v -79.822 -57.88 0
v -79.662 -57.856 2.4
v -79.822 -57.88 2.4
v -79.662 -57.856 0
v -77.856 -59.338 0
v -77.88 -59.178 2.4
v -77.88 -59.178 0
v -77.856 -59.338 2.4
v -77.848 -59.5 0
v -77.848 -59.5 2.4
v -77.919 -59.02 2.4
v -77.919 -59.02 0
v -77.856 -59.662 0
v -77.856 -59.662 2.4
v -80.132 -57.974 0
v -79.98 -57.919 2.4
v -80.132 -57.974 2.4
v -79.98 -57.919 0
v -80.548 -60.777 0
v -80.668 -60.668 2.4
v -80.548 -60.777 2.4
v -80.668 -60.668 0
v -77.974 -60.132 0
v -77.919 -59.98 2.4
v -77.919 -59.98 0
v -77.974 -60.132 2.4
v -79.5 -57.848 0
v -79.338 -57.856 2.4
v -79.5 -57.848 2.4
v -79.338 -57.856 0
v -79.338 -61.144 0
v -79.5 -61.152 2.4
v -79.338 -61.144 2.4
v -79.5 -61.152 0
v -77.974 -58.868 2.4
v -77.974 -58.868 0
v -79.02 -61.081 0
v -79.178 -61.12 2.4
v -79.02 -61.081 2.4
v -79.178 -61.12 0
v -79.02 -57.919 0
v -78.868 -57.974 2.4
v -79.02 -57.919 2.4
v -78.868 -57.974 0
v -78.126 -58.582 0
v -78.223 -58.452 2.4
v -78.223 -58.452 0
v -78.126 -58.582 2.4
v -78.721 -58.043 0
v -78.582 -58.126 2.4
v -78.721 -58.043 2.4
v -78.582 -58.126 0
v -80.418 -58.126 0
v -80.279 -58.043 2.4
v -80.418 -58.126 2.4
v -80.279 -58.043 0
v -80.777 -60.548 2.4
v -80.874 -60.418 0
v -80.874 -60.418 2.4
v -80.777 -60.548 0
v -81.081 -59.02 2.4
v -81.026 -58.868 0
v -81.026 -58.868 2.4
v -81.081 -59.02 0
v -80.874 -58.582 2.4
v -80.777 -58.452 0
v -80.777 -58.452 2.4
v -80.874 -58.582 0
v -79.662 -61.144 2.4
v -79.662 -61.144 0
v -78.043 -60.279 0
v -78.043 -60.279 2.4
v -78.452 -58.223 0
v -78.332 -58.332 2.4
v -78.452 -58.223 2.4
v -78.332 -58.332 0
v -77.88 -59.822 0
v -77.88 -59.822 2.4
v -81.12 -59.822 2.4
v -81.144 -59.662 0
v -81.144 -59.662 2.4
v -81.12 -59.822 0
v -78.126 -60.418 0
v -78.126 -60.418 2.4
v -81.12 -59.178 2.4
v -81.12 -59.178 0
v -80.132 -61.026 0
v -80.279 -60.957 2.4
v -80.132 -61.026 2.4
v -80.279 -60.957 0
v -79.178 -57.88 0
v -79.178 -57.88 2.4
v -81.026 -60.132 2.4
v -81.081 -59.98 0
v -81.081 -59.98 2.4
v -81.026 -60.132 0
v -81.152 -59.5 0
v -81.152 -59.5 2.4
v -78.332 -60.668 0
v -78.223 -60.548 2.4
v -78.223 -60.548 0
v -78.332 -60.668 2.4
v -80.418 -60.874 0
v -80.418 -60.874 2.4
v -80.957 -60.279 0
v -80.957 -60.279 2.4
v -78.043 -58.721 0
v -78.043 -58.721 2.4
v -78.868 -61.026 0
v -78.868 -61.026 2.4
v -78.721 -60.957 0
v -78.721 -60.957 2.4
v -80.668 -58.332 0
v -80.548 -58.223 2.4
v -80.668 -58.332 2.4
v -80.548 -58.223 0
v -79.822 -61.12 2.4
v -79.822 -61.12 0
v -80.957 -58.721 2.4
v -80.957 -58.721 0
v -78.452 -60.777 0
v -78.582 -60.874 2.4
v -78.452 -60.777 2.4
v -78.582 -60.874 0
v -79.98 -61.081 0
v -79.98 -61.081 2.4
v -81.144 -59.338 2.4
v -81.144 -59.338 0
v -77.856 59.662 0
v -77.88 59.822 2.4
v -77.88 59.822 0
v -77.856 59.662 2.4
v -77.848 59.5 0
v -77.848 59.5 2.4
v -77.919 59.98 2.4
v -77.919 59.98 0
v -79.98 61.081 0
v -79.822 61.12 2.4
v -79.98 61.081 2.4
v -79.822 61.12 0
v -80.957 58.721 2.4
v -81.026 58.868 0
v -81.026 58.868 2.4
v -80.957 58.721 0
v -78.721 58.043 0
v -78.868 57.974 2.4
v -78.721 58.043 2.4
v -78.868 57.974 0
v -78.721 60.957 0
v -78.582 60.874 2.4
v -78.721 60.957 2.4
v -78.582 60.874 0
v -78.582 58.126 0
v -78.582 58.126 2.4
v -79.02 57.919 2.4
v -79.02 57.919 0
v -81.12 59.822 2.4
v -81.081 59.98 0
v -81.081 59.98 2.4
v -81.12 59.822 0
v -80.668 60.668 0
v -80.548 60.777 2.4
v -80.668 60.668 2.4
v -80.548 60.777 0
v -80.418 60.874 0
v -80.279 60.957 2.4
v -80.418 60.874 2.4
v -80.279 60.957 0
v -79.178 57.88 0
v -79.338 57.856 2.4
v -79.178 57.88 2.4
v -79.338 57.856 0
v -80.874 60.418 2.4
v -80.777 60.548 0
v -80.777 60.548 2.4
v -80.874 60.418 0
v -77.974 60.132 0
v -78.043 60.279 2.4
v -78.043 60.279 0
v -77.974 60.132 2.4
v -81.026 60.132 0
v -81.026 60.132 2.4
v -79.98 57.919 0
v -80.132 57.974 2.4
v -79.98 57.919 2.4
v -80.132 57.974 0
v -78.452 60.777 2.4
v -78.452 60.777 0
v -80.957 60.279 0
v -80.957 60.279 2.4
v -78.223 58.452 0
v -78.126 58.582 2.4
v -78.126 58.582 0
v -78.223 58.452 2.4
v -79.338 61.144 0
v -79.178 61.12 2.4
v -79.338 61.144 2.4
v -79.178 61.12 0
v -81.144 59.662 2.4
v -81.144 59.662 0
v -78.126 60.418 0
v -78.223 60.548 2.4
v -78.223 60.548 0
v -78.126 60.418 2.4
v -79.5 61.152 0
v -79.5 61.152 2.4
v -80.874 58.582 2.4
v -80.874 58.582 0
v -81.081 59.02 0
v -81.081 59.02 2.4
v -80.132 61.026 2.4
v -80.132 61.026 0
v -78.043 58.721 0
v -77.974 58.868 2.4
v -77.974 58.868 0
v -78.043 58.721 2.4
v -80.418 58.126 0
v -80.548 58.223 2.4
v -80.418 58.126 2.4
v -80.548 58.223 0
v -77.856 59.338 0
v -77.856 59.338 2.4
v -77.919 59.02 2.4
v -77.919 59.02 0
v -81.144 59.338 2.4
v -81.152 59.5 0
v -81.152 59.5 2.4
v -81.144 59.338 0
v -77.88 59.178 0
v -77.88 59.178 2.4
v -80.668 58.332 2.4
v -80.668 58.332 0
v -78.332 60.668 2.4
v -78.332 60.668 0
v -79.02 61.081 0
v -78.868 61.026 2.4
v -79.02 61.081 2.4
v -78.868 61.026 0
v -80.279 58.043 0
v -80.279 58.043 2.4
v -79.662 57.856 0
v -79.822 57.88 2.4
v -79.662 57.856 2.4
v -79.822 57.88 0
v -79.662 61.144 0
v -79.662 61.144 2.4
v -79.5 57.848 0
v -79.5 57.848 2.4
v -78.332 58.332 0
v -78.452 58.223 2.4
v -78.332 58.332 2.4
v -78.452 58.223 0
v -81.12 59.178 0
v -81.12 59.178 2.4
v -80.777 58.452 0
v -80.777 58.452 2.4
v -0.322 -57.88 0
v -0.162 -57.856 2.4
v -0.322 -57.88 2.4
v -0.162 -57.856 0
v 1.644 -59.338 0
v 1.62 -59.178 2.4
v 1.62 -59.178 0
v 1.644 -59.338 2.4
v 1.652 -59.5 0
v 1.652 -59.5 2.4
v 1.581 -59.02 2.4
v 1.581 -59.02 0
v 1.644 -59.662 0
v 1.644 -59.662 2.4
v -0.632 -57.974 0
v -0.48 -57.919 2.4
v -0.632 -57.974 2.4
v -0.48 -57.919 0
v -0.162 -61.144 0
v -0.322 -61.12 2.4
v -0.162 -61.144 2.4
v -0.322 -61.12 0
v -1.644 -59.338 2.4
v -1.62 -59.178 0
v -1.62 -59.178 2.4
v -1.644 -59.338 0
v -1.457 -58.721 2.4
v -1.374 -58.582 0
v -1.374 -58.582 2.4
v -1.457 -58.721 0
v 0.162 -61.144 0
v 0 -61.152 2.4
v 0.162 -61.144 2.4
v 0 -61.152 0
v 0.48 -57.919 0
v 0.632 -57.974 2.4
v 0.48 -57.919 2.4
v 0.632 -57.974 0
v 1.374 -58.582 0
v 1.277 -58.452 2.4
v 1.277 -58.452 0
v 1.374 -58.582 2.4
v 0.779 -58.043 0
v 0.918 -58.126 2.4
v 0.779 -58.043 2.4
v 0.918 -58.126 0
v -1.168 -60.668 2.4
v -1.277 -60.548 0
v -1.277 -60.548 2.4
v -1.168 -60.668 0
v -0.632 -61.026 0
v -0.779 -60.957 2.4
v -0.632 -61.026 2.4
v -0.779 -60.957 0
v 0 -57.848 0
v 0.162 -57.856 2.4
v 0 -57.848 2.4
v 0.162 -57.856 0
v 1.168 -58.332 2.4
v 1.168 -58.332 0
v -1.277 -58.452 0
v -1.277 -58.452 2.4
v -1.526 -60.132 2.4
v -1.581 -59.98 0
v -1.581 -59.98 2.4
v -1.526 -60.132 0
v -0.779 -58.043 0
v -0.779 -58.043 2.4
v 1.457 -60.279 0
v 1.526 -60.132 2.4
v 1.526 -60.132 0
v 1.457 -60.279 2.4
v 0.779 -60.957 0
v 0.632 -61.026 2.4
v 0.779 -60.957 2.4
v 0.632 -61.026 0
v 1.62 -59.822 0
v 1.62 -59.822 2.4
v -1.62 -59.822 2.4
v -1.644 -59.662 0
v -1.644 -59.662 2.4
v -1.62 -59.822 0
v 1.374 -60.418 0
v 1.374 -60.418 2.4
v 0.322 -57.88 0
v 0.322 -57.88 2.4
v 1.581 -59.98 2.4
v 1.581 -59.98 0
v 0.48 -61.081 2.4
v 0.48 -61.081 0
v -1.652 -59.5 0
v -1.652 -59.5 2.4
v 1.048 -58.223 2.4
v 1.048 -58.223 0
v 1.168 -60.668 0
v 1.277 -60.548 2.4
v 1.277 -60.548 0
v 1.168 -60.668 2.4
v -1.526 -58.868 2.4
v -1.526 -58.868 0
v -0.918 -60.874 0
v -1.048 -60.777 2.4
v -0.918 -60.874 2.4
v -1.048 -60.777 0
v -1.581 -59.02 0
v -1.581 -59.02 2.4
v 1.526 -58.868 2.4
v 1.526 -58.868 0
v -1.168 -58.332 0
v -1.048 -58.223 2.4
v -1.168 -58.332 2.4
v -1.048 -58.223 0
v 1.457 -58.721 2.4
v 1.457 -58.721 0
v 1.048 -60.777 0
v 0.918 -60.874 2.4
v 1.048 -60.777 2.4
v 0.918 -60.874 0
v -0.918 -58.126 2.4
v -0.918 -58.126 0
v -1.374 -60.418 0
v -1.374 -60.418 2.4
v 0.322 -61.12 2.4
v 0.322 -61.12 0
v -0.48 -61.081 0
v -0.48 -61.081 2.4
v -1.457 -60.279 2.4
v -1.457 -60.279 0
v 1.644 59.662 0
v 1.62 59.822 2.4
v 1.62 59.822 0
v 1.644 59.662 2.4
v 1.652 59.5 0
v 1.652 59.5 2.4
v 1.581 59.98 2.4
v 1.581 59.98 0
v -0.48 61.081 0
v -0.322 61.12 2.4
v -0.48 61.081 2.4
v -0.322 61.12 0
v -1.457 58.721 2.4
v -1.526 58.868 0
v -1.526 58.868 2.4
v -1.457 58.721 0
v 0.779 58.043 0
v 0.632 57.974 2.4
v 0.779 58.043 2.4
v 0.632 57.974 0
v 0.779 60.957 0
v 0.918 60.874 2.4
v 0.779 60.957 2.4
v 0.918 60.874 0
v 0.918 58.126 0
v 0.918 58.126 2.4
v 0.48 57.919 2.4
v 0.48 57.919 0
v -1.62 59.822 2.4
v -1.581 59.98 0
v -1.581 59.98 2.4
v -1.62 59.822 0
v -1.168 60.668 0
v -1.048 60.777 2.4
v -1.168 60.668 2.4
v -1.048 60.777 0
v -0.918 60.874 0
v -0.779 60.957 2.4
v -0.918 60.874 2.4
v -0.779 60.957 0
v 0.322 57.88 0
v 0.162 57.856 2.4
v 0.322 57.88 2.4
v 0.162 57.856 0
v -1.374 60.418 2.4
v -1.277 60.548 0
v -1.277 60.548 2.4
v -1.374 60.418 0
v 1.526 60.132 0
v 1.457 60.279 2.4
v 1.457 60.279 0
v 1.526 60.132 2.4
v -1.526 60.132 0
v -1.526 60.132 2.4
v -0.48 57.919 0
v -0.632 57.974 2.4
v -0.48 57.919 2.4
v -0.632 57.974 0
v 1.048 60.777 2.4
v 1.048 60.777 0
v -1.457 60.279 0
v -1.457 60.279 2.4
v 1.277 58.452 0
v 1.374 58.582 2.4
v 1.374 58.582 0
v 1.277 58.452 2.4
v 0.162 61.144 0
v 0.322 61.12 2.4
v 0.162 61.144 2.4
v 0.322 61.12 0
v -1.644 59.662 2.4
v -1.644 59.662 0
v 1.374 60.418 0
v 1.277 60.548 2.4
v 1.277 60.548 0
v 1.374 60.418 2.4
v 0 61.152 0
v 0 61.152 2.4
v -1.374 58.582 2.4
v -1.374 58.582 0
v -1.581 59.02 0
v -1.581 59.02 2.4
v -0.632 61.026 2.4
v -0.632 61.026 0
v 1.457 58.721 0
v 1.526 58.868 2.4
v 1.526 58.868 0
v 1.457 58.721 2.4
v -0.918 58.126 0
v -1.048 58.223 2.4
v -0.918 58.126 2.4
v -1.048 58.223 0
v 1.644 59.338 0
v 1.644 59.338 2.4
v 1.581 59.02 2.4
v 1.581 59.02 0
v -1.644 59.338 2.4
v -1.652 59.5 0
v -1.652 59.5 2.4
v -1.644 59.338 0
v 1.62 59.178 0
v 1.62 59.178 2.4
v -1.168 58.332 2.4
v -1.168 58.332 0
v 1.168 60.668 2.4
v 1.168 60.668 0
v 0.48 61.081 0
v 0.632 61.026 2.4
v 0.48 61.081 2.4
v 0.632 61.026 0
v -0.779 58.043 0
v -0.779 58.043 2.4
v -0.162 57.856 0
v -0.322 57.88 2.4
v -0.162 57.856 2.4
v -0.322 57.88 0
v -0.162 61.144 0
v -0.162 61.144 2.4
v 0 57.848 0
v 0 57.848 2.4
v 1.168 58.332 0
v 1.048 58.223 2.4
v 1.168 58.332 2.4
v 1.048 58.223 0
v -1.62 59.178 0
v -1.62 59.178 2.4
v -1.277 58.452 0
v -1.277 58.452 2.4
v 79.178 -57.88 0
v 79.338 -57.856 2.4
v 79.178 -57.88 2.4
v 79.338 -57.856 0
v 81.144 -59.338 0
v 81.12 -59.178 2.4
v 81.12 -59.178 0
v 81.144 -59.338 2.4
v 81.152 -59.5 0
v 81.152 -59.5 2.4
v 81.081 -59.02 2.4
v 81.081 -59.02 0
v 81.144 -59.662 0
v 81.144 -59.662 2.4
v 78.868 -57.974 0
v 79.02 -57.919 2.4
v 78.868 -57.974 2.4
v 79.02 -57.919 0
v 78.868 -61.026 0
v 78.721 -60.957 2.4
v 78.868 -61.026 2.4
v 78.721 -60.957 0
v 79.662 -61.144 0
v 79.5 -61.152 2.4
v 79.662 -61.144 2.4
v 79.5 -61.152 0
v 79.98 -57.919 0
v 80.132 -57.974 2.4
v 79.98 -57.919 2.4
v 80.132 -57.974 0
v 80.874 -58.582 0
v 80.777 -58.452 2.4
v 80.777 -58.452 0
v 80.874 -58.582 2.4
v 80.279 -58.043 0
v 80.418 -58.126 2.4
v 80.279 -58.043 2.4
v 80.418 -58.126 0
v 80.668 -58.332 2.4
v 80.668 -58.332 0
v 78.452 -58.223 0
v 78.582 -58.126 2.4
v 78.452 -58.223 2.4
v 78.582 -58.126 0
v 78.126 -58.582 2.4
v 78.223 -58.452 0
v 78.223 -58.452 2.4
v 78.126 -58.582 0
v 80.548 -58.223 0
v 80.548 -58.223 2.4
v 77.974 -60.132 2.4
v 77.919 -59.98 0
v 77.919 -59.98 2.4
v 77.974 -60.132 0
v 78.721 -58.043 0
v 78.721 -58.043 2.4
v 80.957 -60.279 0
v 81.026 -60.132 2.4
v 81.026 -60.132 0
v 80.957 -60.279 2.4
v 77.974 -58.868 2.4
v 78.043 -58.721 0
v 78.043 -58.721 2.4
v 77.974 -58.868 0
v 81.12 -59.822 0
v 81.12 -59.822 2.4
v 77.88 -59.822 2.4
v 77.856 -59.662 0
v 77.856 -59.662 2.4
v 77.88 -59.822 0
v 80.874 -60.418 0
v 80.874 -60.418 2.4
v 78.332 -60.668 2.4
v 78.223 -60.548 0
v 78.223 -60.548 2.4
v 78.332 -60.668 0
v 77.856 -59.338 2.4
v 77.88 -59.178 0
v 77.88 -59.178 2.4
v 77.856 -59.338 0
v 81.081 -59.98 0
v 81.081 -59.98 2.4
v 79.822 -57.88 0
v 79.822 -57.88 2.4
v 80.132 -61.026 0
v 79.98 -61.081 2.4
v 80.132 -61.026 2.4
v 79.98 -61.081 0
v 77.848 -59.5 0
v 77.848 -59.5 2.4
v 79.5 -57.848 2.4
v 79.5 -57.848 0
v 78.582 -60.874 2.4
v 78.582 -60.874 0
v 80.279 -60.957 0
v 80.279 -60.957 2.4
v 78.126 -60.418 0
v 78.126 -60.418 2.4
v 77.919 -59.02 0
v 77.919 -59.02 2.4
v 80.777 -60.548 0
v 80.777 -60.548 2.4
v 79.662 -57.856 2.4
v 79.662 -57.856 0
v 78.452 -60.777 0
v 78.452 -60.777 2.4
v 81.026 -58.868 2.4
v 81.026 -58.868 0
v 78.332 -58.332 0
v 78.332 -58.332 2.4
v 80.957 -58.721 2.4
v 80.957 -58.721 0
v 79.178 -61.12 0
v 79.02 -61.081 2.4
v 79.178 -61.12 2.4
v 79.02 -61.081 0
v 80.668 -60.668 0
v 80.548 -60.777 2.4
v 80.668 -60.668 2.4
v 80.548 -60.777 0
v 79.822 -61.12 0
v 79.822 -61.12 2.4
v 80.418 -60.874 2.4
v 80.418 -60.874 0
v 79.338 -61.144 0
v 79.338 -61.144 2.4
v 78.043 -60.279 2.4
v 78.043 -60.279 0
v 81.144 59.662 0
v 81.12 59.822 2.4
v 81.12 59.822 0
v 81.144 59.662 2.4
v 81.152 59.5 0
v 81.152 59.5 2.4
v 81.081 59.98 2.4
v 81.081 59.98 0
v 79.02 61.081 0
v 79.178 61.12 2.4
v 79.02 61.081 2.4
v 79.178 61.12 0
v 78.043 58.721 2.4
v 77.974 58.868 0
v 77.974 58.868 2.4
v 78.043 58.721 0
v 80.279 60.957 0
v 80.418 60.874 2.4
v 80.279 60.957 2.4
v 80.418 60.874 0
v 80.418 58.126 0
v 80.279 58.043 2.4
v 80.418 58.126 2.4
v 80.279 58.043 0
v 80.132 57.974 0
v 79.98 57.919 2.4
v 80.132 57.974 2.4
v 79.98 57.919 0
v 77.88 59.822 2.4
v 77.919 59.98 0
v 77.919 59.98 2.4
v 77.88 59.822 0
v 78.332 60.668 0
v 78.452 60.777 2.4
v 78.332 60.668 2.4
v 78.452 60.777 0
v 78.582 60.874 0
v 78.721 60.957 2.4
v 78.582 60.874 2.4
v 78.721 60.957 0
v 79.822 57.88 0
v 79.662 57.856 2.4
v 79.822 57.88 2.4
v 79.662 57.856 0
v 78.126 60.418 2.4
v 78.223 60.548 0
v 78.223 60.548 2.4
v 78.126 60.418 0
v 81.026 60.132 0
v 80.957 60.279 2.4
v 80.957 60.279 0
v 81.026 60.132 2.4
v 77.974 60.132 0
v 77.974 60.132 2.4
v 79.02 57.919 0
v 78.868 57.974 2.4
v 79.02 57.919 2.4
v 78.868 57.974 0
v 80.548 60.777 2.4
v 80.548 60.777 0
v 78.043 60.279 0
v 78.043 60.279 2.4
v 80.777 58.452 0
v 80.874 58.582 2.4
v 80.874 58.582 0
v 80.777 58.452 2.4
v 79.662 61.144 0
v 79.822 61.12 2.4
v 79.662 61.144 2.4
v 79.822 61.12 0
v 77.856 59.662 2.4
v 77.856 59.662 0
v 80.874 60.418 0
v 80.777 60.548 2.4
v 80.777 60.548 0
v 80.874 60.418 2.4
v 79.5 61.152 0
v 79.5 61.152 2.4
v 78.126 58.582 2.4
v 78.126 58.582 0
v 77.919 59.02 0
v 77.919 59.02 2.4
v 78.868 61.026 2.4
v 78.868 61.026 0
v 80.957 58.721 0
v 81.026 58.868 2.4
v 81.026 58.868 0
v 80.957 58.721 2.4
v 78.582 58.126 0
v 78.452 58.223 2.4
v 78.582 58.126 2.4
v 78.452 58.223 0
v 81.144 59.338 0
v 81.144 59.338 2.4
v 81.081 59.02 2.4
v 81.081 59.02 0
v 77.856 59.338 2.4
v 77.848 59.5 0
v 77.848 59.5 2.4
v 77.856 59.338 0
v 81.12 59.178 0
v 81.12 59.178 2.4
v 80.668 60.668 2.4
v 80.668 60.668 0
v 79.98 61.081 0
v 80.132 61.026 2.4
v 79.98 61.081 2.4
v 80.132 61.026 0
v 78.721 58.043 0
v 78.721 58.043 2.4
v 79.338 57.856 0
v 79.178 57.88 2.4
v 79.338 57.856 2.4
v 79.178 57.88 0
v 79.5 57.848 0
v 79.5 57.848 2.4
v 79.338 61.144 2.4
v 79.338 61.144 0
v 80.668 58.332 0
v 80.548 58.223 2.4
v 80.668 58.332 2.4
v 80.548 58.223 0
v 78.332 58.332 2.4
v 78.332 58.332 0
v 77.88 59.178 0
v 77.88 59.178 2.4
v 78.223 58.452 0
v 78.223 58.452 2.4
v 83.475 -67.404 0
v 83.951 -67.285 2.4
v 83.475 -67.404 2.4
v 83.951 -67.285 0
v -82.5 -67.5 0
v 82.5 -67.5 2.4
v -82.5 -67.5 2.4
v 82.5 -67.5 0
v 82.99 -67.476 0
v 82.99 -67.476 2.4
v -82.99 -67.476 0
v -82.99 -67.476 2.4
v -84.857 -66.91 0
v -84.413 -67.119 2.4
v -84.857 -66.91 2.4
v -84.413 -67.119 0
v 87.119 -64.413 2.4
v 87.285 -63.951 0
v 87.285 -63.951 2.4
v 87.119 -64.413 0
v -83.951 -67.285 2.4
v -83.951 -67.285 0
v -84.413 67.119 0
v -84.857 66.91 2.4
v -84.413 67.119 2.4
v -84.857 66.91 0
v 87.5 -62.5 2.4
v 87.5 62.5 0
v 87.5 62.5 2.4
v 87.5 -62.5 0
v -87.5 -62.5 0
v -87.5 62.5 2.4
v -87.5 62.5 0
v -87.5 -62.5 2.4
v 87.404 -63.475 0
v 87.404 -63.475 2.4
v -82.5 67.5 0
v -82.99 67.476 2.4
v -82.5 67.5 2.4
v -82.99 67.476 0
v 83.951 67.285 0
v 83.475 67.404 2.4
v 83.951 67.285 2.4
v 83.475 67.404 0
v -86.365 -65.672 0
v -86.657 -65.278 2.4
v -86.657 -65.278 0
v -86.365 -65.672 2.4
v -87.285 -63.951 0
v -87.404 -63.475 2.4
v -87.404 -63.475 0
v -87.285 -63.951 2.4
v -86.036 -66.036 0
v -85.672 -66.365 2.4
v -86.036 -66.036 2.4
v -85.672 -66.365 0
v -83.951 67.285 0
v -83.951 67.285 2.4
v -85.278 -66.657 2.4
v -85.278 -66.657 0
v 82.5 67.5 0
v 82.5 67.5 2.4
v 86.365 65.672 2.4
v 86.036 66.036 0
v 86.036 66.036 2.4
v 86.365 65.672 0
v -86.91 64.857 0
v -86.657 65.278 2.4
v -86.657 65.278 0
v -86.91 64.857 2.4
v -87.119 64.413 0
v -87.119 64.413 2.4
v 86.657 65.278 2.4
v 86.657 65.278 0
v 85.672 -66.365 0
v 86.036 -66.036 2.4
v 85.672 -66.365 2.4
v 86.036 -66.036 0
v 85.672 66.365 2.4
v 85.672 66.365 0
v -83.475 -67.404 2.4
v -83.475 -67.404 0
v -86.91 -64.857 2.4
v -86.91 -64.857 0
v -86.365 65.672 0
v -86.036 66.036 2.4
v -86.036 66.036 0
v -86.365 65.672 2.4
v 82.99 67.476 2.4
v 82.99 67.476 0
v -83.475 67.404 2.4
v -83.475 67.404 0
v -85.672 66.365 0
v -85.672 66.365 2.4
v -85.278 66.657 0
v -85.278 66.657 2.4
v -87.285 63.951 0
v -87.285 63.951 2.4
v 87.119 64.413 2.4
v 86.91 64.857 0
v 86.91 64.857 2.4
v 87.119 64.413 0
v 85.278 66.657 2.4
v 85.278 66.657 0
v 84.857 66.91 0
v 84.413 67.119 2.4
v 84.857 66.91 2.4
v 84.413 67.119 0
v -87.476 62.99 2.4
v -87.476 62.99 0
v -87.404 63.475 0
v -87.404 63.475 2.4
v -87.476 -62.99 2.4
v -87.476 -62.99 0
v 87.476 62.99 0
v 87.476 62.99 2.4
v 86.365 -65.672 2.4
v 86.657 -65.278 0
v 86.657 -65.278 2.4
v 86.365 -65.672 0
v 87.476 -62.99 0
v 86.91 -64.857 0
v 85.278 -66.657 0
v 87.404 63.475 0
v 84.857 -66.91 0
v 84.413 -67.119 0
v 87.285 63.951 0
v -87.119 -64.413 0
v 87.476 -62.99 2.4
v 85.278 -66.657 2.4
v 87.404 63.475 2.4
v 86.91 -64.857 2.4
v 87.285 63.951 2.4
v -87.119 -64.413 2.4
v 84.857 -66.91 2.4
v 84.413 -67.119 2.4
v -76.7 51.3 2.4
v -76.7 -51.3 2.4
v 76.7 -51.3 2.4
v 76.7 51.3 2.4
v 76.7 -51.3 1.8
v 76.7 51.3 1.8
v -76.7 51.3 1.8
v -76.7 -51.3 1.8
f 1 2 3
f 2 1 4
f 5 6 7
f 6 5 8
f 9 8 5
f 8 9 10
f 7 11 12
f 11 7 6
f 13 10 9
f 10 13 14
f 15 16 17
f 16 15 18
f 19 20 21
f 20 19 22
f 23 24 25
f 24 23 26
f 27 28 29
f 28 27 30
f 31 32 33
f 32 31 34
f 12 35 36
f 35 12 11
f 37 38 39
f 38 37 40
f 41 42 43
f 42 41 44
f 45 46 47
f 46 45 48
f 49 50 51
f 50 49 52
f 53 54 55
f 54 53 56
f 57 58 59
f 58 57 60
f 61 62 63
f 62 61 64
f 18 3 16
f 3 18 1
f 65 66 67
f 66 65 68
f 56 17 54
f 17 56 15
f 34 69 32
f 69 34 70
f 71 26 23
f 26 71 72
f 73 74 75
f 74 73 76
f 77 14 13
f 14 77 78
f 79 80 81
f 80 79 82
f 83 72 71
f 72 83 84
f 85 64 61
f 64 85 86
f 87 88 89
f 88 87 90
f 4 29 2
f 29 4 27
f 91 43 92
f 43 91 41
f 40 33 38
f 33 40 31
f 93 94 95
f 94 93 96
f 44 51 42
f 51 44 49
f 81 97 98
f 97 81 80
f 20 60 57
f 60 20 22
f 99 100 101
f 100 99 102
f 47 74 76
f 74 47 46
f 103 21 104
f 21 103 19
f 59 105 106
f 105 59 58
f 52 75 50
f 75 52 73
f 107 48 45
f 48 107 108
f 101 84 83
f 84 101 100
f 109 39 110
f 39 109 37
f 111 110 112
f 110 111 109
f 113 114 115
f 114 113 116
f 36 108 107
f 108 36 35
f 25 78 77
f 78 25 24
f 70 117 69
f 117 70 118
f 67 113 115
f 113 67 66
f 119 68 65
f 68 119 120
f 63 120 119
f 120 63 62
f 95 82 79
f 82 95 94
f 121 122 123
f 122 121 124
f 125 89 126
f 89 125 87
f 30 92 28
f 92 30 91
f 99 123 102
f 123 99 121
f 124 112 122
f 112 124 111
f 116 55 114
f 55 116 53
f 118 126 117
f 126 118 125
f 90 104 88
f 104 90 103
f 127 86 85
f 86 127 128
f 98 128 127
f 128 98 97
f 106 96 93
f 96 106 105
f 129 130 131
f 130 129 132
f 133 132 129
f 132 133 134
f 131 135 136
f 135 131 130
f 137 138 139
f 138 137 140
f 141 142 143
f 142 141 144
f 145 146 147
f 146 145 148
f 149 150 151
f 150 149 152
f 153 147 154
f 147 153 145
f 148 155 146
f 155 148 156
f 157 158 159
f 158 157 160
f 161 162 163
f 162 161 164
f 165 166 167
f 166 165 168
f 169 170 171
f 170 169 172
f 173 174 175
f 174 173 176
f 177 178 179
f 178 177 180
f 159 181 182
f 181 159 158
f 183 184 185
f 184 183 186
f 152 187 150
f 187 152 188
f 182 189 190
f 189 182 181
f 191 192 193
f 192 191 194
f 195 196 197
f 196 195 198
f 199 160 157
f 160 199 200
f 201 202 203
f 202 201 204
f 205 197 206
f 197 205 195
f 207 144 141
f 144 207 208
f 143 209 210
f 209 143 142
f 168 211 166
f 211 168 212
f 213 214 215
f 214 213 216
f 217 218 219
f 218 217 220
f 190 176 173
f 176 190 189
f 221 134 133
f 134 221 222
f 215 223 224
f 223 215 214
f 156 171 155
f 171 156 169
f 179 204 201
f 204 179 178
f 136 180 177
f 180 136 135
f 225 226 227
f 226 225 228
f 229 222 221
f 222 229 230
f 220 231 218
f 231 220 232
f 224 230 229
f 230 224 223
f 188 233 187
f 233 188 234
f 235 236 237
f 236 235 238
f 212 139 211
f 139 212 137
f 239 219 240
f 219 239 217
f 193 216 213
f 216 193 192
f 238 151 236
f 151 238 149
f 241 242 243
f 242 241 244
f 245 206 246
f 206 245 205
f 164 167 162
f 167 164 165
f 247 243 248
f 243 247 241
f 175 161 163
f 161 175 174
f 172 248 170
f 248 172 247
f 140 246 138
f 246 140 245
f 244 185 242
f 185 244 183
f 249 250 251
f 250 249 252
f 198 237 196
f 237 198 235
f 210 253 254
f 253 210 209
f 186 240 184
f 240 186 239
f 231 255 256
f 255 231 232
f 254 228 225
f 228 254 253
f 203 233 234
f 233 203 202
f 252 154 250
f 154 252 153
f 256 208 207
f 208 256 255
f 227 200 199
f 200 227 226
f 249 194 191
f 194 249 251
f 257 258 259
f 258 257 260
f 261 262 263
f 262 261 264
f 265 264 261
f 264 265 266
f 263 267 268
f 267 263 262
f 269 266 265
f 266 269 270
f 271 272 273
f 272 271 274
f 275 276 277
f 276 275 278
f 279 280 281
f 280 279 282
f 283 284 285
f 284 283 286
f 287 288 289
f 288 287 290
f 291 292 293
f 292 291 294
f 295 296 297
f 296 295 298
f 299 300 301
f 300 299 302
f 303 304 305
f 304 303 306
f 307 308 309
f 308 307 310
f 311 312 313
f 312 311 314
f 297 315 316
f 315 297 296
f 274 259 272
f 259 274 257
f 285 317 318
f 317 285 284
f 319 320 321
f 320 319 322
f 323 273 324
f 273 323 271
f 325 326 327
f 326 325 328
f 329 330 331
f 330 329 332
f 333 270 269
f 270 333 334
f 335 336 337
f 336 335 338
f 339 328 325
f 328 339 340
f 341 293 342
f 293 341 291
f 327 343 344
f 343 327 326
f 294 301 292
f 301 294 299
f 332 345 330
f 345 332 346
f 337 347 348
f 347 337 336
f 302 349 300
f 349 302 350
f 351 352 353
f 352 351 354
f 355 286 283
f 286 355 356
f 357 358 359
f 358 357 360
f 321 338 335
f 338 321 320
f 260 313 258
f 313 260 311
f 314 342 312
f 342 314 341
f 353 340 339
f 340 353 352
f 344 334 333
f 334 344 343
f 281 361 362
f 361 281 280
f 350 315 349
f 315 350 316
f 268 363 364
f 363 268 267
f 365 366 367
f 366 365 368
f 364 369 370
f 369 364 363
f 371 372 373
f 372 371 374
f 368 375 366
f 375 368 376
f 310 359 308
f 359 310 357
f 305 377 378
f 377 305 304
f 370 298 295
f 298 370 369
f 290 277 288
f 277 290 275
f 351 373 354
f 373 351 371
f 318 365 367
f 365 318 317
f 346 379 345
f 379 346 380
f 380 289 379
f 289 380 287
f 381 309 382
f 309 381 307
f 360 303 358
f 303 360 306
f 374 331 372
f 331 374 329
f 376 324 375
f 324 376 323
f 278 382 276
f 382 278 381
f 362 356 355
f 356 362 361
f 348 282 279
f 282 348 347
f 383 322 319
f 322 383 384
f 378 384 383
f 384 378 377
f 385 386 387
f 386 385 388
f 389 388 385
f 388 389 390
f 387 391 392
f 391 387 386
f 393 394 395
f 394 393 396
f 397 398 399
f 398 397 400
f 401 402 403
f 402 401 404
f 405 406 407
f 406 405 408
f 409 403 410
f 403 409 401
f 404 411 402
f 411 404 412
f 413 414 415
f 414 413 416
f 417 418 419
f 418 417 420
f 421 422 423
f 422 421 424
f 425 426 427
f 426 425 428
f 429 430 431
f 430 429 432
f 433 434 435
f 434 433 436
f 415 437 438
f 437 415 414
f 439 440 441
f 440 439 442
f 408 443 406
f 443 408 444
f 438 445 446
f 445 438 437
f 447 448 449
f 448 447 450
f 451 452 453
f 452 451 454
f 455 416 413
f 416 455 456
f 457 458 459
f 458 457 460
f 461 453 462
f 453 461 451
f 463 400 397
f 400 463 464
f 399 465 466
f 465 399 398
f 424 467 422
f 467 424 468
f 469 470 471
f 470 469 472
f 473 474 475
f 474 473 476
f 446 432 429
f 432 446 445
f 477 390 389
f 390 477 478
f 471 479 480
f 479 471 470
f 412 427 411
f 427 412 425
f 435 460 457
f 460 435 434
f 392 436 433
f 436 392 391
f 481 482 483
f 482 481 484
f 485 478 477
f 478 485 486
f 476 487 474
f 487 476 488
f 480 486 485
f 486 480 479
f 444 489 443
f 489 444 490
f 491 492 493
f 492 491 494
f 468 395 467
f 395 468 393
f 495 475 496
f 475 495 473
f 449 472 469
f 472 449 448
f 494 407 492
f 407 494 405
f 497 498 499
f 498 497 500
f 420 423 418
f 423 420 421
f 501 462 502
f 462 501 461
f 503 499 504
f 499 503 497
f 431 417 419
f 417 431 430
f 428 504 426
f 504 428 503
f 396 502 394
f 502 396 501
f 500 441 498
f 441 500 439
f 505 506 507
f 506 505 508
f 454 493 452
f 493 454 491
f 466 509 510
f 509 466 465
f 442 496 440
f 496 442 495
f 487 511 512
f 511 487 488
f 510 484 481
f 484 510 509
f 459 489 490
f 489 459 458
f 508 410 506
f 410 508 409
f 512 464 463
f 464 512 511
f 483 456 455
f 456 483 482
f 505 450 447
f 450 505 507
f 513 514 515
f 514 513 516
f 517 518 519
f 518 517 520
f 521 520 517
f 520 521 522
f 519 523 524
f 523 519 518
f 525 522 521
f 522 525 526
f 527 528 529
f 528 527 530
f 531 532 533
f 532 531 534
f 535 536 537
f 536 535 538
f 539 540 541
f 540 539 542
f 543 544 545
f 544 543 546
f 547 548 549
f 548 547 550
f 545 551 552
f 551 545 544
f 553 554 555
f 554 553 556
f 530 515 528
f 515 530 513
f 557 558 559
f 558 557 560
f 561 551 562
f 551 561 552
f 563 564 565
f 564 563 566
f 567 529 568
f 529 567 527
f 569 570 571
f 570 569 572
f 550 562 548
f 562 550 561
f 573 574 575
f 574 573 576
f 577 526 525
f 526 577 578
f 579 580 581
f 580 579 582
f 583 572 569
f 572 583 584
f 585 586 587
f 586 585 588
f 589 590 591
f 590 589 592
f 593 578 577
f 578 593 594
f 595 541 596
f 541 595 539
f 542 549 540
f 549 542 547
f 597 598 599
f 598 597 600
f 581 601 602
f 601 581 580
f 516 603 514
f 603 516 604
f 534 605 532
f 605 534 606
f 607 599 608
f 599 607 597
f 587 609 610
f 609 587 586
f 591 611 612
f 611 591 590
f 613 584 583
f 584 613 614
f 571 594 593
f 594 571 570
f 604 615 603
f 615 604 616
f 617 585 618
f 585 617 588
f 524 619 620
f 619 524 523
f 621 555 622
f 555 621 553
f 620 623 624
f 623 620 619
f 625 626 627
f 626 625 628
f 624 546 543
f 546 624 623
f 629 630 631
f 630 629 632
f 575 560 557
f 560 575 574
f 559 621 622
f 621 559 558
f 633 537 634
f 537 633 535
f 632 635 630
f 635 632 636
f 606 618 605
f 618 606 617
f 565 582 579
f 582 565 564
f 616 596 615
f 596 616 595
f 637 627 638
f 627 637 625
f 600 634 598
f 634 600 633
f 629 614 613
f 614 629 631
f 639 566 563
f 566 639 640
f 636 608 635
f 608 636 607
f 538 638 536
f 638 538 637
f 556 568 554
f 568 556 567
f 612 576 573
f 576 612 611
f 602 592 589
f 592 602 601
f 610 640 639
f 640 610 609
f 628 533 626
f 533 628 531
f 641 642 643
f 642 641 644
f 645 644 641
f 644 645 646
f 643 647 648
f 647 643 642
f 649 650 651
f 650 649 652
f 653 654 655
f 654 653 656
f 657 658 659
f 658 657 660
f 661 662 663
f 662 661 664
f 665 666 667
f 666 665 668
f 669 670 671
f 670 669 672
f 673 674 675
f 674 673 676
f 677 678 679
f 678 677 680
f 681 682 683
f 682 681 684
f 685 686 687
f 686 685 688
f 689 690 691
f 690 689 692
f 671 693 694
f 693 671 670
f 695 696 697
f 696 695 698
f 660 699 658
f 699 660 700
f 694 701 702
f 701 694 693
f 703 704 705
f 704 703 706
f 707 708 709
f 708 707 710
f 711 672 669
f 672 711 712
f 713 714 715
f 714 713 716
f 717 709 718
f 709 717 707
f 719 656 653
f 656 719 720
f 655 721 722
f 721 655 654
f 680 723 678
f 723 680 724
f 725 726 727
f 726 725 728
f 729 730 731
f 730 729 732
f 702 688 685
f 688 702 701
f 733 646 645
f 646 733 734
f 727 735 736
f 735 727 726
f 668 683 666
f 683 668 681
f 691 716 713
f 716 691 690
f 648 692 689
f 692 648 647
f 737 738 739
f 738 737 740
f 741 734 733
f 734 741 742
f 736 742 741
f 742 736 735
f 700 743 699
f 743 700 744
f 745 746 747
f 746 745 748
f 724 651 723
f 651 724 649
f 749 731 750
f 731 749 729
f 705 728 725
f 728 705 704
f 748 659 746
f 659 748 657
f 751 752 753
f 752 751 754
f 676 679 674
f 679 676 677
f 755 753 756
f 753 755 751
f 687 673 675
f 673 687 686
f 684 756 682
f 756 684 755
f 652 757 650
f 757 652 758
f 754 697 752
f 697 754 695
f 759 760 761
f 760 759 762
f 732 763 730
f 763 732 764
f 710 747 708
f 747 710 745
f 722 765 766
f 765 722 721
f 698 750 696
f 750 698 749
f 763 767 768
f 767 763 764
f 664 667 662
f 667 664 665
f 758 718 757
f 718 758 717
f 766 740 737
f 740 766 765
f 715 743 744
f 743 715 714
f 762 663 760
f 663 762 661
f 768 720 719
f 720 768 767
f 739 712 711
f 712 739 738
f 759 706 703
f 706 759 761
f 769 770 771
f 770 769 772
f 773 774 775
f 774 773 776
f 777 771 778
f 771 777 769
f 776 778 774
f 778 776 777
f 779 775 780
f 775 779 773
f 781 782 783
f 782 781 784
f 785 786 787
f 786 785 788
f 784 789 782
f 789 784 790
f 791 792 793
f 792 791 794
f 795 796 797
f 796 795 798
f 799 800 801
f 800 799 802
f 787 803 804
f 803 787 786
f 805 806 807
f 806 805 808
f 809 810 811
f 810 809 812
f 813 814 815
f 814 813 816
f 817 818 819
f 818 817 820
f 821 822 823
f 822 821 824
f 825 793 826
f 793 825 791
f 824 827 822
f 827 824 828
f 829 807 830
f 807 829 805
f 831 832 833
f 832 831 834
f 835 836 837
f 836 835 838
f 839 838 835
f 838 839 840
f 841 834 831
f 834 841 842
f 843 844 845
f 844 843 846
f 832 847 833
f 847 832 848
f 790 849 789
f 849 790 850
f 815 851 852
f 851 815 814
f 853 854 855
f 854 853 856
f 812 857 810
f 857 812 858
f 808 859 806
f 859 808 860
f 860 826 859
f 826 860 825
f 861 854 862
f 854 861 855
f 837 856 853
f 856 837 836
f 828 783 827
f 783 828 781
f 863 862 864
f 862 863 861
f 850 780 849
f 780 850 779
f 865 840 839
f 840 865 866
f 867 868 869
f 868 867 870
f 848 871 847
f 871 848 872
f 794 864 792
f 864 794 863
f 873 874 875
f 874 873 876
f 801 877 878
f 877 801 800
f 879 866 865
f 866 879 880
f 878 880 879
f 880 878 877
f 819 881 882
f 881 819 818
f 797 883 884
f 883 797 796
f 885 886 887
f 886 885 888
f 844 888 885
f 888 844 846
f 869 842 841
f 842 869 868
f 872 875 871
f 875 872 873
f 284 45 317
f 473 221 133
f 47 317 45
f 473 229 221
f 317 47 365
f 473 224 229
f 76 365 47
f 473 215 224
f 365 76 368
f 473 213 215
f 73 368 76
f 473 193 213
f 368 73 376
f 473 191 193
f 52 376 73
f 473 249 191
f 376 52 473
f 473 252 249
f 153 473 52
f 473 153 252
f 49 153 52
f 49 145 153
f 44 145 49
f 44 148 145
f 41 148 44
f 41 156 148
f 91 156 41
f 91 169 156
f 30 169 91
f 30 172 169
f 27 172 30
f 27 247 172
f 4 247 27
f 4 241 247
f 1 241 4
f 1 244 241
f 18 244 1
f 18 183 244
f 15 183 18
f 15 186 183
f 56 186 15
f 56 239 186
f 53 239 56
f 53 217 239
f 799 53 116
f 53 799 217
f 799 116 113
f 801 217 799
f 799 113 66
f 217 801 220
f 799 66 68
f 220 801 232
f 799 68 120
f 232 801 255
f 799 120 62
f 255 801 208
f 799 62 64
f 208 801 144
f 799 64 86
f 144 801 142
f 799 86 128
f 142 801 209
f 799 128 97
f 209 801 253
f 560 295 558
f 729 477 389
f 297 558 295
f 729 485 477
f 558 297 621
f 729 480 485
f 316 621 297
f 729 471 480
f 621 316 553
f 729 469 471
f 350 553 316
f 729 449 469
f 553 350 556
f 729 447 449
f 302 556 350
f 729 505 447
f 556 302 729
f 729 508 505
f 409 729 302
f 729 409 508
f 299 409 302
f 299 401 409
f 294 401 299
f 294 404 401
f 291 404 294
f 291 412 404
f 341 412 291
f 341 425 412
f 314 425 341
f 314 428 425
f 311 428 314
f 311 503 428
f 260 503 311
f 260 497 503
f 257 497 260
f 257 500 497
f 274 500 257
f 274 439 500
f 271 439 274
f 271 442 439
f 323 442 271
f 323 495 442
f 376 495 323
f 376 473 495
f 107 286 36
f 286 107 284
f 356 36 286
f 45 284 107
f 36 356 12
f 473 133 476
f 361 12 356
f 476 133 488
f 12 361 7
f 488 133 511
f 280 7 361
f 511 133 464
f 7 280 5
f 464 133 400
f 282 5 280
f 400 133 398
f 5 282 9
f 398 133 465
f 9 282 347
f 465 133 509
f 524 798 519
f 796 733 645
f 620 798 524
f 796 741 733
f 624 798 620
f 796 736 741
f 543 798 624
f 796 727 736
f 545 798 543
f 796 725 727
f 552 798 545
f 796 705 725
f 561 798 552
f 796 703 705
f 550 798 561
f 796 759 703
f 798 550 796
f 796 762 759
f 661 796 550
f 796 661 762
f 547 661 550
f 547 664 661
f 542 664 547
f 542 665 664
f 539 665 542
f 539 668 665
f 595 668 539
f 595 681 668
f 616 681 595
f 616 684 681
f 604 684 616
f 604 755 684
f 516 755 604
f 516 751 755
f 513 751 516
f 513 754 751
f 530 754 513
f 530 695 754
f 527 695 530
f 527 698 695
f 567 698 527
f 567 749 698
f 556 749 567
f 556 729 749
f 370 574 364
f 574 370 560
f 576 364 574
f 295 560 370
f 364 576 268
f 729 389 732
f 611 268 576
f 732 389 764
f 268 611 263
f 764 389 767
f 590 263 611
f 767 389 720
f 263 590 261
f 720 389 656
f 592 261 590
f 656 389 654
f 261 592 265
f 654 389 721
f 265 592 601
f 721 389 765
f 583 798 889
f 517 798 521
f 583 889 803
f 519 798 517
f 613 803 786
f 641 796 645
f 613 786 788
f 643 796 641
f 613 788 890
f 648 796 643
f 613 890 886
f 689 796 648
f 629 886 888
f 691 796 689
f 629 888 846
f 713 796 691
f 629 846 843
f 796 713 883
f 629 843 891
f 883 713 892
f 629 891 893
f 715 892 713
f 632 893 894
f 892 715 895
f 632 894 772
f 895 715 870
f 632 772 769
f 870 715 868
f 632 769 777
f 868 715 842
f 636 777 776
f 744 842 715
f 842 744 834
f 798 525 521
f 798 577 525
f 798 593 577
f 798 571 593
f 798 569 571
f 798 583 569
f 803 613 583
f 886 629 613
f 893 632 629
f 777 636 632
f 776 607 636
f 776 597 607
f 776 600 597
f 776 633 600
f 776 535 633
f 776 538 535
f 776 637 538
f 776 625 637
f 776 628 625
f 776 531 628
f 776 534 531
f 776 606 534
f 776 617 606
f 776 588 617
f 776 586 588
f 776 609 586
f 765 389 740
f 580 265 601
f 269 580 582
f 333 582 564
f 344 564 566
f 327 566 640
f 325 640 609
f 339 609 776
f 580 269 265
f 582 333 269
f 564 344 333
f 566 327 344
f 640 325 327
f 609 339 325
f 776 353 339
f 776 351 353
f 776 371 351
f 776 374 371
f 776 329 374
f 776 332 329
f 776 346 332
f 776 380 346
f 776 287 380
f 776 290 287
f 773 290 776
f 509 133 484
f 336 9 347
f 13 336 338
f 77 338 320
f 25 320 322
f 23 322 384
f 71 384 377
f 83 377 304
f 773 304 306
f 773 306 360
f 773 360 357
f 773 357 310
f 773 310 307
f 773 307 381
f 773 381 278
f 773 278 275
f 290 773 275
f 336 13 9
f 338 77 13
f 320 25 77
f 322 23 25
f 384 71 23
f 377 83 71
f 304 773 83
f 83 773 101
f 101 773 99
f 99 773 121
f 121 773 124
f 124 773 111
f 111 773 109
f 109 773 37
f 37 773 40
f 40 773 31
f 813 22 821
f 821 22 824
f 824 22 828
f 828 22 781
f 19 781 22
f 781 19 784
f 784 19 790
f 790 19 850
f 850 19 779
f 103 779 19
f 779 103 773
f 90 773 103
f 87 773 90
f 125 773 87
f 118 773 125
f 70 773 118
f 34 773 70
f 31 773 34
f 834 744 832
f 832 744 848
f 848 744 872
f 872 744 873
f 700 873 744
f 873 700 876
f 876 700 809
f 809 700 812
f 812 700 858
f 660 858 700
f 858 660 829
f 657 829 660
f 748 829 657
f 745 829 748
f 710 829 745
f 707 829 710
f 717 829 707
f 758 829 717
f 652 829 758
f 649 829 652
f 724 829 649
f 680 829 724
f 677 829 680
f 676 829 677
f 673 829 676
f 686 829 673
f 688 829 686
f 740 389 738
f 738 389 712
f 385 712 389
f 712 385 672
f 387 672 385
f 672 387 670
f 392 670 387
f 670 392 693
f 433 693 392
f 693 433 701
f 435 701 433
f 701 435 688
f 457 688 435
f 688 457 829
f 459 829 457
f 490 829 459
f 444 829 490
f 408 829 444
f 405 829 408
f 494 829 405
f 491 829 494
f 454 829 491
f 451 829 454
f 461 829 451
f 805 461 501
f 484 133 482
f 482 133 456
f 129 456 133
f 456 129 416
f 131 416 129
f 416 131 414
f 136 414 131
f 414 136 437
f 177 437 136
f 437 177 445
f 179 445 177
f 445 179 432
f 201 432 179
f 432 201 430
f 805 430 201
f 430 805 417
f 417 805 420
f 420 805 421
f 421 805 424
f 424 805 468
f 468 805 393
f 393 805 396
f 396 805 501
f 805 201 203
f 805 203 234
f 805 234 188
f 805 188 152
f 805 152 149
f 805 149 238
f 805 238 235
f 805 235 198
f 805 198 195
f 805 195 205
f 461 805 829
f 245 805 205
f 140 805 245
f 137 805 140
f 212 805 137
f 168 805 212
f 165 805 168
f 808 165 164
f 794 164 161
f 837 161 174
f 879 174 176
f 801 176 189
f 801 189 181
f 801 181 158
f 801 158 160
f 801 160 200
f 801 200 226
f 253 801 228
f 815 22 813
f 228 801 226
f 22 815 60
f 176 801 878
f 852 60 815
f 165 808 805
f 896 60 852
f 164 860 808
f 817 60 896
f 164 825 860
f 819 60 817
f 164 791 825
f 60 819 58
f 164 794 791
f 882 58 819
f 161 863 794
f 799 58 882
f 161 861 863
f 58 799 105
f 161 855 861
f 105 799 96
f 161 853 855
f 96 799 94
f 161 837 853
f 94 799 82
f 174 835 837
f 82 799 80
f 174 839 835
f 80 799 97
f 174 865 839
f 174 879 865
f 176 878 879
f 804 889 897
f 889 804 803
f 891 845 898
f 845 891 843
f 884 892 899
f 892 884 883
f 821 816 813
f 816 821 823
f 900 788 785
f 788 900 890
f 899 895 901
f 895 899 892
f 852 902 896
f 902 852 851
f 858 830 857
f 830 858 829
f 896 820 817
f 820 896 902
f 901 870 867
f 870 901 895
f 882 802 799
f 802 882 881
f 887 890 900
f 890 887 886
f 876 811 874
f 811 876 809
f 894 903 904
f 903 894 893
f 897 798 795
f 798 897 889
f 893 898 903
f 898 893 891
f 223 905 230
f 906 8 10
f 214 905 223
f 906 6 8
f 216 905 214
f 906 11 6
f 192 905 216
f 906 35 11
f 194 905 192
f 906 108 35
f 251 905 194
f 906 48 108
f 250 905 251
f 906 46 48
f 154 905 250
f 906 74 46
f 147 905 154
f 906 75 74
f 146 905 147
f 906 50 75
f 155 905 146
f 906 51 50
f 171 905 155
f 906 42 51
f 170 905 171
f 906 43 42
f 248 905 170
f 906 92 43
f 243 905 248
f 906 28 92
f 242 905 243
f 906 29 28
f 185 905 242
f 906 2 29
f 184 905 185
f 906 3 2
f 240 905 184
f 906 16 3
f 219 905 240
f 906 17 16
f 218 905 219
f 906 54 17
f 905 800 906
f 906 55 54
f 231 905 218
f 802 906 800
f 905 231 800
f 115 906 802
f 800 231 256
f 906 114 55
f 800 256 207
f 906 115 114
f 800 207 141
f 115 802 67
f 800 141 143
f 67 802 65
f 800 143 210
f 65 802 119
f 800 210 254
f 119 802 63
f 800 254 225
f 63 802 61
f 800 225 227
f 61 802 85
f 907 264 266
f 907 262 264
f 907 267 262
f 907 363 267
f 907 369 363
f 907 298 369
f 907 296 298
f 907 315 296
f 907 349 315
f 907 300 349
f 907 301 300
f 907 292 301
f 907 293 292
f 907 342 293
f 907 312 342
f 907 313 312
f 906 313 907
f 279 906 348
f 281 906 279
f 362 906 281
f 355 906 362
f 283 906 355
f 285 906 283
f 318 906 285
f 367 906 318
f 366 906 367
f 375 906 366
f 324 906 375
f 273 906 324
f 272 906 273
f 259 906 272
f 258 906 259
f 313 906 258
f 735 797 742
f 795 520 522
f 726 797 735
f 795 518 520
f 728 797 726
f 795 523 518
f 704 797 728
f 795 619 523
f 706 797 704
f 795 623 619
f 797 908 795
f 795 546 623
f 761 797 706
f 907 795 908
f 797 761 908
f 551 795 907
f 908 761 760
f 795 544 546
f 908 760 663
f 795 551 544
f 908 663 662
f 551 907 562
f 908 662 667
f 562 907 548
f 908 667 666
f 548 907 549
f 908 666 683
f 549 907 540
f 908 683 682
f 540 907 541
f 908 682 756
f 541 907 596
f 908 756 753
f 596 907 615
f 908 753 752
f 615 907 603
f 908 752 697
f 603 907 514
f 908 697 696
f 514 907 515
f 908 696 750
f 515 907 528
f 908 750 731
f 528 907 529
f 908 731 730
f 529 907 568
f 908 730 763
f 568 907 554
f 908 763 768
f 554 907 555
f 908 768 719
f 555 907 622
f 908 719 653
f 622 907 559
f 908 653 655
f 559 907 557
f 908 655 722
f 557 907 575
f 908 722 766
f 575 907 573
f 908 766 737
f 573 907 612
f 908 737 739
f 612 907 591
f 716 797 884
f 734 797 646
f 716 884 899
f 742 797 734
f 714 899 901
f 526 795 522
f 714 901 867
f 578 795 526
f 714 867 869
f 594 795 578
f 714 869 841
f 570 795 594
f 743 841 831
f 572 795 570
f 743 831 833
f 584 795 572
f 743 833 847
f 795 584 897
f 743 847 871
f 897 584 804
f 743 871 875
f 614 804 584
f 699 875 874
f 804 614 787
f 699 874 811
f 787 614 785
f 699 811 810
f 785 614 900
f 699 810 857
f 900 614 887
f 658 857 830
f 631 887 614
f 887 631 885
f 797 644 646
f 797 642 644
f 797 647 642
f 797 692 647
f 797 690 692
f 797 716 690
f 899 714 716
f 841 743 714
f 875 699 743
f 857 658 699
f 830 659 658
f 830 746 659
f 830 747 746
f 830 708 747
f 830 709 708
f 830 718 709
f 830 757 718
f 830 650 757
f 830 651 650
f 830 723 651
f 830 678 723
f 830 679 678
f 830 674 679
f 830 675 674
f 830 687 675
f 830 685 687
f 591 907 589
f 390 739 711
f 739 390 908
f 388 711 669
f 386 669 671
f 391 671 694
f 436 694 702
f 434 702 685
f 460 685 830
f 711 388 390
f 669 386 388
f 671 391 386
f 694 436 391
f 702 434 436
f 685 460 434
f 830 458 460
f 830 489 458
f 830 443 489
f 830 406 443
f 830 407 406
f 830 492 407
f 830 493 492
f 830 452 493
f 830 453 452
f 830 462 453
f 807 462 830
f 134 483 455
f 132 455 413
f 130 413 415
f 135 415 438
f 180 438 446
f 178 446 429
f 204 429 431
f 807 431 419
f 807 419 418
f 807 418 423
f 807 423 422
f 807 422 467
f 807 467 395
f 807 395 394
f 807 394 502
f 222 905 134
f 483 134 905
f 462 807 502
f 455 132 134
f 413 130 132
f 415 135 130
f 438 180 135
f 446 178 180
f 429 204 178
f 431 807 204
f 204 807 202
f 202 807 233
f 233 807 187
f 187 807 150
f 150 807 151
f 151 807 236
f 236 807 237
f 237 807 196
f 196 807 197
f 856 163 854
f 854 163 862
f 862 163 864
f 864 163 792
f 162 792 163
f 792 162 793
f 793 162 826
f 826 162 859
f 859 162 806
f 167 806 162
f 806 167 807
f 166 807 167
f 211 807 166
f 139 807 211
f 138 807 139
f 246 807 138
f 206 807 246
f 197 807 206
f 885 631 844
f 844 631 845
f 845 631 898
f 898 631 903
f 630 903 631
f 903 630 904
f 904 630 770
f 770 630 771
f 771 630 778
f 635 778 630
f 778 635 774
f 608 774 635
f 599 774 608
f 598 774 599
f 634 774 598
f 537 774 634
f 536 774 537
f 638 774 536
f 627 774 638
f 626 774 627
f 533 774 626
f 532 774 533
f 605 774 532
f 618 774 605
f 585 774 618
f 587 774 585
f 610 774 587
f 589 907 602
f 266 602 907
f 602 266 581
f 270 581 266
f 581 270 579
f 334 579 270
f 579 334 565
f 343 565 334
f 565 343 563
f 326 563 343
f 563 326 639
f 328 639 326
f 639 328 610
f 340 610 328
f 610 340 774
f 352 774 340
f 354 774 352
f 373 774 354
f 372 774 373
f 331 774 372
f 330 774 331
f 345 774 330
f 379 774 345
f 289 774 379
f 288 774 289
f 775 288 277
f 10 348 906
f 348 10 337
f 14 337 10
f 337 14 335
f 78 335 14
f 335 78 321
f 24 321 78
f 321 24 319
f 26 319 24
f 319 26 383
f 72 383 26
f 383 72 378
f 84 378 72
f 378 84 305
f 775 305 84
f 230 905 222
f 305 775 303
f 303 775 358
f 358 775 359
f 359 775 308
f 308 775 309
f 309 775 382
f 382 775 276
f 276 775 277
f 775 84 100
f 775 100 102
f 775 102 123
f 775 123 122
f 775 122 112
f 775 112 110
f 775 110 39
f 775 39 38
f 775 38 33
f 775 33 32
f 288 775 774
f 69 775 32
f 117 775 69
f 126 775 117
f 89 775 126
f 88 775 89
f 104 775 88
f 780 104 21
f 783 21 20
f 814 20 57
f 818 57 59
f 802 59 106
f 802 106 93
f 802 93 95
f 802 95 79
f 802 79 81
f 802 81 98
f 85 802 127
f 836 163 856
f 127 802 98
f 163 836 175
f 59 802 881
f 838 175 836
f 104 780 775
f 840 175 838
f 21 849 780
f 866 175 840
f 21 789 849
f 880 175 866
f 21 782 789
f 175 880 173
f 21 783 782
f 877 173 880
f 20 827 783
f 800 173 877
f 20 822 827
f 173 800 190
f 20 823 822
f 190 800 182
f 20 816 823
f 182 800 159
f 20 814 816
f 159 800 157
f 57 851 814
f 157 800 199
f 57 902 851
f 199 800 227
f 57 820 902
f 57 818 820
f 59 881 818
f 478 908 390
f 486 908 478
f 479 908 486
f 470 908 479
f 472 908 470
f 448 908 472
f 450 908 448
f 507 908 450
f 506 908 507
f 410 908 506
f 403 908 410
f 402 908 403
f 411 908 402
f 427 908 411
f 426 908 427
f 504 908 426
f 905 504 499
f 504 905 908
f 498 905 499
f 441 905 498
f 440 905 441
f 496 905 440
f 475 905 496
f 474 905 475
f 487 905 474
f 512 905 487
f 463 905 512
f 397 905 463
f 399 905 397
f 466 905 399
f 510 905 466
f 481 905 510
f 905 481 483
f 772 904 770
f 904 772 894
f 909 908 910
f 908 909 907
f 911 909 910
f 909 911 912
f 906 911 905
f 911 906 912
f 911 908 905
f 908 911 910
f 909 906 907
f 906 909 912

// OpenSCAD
// Flat adhesive-label placard for fabric storage cubes.
// A 6 x 4 inch adhesive label sits in a shallow front recess. Three rivets above
// and three below the label keep the hardware clear of the label itself.
// Print flat, back on the bed, label face upward. Use metal backing washers
// on the fabric side and rivets whose grip range covers the complete stack.

/* [Label] */
label_w = 152.4;         // mm, 6 inches
label_h = 101.6;         // mm, 4 inches
label_margin = 2;       // mm, clear space beyond each label edge
label_clearance = 0.5;  // mm, recess clearance on each side of the label
recess_depth = 0.6;     // mm, below the front face; leaves a 1.8 mm floor

/* [Plate] */
plate_w = 175;          // mm, overall width
plate_h = 135;          // mm, overall height
plate_t = 2.4;          // mm, uniform plate thickness
corner_r = 5;           // mm, rounded outside corners

/* [Rivets] */
rivet_d = 3.2;          // mm, nominal shank; 1/8 inch by default
hole_clearance = 0.1;   // mm, diametral clearance; verify with the actual rivet
rivet_count = 6;        // [4, 6]
hole_edge = 8;          // mm, hole centre to straight plate edge
head_clear_d = 12;      // mm, reserved diameter for a head or washer

/* [Display] */
show = "placard";      // [placard, label-layout]

/* [Colors] */
plate_color = "SteelBlue";
label_color = "White"; // reference only, never part of the placard STL

/* [Hidden] */
$fn = 64;
eps = 0.01;            // mm, overshoot for every through-cut
hole_d = rivet_d + hole_clearance;
hole_r = hole_d / (2 * cos(180 / $fn)); // circumscribed bore clears across flats
hole_x = plate_w / 2 - hole_edge;
hole_y = plate_h / 2 - hole_edge;
hole_columns = rivet_count == 6 ? [-hole_x, 0, hole_x] : [-hole_x, hole_x];
pocket_w = label_w + 2 * label_clearance;
pocket_h = label_h + 2 * label_clearance;
recess_floor_z = plate_t - recess_depth;

assert(plate_t > 0 && corner_r > 0 && 2 * corner_r < min(plate_w, plate_h));
assert(recess_depth > 0 && recess_depth < plate_t, "Recess must leave a solid floor");
assert(label_clearance > 0 && label_clearance <= label_margin);
assert(rivet_count == 4 || rivet_count == 6, "Choose four or six rivets");
assert(rivet_d > 0 && hole_clearance > 0 && head_clear_d >= hole_d);
assert(label_w + 2 * label_margin < plate_w, "Label needs clear space at the sides");
assert(hole_y - head_clear_d / 2 >= label_h / 2 + label_margin,
       "Rivet heads or washers would overlap the reserved label area");
assert(hole_edge >= 2 * rivet_d && hole_edge >= head_clear_d / 2,
       "Keep adequate edge distance and room for the rivet head");
assert(hole_edge >= corner_r, "Keep the holes away from the rounded corner cutouts");

module placard() {
    color(plate_color) difference() {
        linear_extrude(height = plate_t, convexity = 10)
            offset(r = corner_r)
                square([plate_w - 2 * corner_r, plate_h - 2 * corner_r], center = true);
        for (x = hole_columns)
            for (y = [-hole_y, hole_y])
                translate([x, y, -eps]) cylinder(r = hole_r, h = plate_t + 2 * eps);
        translate([-pocket_w / 2, -pocket_h / 2, recess_floor_z])
            cube([pocket_w, pocket_h, recess_depth + eps]);
    }
}

module label_reference() {
    // OpenSCAD's background modifier excludes this visual guide from STL exports.
    %color(label_color)
        translate([-label_w / 2, -label_h / 2, recess_floor_z + eps])
            cube([label_w, label_h, eps]);
}

placard();
if (show == "label-layout") label_reference();
